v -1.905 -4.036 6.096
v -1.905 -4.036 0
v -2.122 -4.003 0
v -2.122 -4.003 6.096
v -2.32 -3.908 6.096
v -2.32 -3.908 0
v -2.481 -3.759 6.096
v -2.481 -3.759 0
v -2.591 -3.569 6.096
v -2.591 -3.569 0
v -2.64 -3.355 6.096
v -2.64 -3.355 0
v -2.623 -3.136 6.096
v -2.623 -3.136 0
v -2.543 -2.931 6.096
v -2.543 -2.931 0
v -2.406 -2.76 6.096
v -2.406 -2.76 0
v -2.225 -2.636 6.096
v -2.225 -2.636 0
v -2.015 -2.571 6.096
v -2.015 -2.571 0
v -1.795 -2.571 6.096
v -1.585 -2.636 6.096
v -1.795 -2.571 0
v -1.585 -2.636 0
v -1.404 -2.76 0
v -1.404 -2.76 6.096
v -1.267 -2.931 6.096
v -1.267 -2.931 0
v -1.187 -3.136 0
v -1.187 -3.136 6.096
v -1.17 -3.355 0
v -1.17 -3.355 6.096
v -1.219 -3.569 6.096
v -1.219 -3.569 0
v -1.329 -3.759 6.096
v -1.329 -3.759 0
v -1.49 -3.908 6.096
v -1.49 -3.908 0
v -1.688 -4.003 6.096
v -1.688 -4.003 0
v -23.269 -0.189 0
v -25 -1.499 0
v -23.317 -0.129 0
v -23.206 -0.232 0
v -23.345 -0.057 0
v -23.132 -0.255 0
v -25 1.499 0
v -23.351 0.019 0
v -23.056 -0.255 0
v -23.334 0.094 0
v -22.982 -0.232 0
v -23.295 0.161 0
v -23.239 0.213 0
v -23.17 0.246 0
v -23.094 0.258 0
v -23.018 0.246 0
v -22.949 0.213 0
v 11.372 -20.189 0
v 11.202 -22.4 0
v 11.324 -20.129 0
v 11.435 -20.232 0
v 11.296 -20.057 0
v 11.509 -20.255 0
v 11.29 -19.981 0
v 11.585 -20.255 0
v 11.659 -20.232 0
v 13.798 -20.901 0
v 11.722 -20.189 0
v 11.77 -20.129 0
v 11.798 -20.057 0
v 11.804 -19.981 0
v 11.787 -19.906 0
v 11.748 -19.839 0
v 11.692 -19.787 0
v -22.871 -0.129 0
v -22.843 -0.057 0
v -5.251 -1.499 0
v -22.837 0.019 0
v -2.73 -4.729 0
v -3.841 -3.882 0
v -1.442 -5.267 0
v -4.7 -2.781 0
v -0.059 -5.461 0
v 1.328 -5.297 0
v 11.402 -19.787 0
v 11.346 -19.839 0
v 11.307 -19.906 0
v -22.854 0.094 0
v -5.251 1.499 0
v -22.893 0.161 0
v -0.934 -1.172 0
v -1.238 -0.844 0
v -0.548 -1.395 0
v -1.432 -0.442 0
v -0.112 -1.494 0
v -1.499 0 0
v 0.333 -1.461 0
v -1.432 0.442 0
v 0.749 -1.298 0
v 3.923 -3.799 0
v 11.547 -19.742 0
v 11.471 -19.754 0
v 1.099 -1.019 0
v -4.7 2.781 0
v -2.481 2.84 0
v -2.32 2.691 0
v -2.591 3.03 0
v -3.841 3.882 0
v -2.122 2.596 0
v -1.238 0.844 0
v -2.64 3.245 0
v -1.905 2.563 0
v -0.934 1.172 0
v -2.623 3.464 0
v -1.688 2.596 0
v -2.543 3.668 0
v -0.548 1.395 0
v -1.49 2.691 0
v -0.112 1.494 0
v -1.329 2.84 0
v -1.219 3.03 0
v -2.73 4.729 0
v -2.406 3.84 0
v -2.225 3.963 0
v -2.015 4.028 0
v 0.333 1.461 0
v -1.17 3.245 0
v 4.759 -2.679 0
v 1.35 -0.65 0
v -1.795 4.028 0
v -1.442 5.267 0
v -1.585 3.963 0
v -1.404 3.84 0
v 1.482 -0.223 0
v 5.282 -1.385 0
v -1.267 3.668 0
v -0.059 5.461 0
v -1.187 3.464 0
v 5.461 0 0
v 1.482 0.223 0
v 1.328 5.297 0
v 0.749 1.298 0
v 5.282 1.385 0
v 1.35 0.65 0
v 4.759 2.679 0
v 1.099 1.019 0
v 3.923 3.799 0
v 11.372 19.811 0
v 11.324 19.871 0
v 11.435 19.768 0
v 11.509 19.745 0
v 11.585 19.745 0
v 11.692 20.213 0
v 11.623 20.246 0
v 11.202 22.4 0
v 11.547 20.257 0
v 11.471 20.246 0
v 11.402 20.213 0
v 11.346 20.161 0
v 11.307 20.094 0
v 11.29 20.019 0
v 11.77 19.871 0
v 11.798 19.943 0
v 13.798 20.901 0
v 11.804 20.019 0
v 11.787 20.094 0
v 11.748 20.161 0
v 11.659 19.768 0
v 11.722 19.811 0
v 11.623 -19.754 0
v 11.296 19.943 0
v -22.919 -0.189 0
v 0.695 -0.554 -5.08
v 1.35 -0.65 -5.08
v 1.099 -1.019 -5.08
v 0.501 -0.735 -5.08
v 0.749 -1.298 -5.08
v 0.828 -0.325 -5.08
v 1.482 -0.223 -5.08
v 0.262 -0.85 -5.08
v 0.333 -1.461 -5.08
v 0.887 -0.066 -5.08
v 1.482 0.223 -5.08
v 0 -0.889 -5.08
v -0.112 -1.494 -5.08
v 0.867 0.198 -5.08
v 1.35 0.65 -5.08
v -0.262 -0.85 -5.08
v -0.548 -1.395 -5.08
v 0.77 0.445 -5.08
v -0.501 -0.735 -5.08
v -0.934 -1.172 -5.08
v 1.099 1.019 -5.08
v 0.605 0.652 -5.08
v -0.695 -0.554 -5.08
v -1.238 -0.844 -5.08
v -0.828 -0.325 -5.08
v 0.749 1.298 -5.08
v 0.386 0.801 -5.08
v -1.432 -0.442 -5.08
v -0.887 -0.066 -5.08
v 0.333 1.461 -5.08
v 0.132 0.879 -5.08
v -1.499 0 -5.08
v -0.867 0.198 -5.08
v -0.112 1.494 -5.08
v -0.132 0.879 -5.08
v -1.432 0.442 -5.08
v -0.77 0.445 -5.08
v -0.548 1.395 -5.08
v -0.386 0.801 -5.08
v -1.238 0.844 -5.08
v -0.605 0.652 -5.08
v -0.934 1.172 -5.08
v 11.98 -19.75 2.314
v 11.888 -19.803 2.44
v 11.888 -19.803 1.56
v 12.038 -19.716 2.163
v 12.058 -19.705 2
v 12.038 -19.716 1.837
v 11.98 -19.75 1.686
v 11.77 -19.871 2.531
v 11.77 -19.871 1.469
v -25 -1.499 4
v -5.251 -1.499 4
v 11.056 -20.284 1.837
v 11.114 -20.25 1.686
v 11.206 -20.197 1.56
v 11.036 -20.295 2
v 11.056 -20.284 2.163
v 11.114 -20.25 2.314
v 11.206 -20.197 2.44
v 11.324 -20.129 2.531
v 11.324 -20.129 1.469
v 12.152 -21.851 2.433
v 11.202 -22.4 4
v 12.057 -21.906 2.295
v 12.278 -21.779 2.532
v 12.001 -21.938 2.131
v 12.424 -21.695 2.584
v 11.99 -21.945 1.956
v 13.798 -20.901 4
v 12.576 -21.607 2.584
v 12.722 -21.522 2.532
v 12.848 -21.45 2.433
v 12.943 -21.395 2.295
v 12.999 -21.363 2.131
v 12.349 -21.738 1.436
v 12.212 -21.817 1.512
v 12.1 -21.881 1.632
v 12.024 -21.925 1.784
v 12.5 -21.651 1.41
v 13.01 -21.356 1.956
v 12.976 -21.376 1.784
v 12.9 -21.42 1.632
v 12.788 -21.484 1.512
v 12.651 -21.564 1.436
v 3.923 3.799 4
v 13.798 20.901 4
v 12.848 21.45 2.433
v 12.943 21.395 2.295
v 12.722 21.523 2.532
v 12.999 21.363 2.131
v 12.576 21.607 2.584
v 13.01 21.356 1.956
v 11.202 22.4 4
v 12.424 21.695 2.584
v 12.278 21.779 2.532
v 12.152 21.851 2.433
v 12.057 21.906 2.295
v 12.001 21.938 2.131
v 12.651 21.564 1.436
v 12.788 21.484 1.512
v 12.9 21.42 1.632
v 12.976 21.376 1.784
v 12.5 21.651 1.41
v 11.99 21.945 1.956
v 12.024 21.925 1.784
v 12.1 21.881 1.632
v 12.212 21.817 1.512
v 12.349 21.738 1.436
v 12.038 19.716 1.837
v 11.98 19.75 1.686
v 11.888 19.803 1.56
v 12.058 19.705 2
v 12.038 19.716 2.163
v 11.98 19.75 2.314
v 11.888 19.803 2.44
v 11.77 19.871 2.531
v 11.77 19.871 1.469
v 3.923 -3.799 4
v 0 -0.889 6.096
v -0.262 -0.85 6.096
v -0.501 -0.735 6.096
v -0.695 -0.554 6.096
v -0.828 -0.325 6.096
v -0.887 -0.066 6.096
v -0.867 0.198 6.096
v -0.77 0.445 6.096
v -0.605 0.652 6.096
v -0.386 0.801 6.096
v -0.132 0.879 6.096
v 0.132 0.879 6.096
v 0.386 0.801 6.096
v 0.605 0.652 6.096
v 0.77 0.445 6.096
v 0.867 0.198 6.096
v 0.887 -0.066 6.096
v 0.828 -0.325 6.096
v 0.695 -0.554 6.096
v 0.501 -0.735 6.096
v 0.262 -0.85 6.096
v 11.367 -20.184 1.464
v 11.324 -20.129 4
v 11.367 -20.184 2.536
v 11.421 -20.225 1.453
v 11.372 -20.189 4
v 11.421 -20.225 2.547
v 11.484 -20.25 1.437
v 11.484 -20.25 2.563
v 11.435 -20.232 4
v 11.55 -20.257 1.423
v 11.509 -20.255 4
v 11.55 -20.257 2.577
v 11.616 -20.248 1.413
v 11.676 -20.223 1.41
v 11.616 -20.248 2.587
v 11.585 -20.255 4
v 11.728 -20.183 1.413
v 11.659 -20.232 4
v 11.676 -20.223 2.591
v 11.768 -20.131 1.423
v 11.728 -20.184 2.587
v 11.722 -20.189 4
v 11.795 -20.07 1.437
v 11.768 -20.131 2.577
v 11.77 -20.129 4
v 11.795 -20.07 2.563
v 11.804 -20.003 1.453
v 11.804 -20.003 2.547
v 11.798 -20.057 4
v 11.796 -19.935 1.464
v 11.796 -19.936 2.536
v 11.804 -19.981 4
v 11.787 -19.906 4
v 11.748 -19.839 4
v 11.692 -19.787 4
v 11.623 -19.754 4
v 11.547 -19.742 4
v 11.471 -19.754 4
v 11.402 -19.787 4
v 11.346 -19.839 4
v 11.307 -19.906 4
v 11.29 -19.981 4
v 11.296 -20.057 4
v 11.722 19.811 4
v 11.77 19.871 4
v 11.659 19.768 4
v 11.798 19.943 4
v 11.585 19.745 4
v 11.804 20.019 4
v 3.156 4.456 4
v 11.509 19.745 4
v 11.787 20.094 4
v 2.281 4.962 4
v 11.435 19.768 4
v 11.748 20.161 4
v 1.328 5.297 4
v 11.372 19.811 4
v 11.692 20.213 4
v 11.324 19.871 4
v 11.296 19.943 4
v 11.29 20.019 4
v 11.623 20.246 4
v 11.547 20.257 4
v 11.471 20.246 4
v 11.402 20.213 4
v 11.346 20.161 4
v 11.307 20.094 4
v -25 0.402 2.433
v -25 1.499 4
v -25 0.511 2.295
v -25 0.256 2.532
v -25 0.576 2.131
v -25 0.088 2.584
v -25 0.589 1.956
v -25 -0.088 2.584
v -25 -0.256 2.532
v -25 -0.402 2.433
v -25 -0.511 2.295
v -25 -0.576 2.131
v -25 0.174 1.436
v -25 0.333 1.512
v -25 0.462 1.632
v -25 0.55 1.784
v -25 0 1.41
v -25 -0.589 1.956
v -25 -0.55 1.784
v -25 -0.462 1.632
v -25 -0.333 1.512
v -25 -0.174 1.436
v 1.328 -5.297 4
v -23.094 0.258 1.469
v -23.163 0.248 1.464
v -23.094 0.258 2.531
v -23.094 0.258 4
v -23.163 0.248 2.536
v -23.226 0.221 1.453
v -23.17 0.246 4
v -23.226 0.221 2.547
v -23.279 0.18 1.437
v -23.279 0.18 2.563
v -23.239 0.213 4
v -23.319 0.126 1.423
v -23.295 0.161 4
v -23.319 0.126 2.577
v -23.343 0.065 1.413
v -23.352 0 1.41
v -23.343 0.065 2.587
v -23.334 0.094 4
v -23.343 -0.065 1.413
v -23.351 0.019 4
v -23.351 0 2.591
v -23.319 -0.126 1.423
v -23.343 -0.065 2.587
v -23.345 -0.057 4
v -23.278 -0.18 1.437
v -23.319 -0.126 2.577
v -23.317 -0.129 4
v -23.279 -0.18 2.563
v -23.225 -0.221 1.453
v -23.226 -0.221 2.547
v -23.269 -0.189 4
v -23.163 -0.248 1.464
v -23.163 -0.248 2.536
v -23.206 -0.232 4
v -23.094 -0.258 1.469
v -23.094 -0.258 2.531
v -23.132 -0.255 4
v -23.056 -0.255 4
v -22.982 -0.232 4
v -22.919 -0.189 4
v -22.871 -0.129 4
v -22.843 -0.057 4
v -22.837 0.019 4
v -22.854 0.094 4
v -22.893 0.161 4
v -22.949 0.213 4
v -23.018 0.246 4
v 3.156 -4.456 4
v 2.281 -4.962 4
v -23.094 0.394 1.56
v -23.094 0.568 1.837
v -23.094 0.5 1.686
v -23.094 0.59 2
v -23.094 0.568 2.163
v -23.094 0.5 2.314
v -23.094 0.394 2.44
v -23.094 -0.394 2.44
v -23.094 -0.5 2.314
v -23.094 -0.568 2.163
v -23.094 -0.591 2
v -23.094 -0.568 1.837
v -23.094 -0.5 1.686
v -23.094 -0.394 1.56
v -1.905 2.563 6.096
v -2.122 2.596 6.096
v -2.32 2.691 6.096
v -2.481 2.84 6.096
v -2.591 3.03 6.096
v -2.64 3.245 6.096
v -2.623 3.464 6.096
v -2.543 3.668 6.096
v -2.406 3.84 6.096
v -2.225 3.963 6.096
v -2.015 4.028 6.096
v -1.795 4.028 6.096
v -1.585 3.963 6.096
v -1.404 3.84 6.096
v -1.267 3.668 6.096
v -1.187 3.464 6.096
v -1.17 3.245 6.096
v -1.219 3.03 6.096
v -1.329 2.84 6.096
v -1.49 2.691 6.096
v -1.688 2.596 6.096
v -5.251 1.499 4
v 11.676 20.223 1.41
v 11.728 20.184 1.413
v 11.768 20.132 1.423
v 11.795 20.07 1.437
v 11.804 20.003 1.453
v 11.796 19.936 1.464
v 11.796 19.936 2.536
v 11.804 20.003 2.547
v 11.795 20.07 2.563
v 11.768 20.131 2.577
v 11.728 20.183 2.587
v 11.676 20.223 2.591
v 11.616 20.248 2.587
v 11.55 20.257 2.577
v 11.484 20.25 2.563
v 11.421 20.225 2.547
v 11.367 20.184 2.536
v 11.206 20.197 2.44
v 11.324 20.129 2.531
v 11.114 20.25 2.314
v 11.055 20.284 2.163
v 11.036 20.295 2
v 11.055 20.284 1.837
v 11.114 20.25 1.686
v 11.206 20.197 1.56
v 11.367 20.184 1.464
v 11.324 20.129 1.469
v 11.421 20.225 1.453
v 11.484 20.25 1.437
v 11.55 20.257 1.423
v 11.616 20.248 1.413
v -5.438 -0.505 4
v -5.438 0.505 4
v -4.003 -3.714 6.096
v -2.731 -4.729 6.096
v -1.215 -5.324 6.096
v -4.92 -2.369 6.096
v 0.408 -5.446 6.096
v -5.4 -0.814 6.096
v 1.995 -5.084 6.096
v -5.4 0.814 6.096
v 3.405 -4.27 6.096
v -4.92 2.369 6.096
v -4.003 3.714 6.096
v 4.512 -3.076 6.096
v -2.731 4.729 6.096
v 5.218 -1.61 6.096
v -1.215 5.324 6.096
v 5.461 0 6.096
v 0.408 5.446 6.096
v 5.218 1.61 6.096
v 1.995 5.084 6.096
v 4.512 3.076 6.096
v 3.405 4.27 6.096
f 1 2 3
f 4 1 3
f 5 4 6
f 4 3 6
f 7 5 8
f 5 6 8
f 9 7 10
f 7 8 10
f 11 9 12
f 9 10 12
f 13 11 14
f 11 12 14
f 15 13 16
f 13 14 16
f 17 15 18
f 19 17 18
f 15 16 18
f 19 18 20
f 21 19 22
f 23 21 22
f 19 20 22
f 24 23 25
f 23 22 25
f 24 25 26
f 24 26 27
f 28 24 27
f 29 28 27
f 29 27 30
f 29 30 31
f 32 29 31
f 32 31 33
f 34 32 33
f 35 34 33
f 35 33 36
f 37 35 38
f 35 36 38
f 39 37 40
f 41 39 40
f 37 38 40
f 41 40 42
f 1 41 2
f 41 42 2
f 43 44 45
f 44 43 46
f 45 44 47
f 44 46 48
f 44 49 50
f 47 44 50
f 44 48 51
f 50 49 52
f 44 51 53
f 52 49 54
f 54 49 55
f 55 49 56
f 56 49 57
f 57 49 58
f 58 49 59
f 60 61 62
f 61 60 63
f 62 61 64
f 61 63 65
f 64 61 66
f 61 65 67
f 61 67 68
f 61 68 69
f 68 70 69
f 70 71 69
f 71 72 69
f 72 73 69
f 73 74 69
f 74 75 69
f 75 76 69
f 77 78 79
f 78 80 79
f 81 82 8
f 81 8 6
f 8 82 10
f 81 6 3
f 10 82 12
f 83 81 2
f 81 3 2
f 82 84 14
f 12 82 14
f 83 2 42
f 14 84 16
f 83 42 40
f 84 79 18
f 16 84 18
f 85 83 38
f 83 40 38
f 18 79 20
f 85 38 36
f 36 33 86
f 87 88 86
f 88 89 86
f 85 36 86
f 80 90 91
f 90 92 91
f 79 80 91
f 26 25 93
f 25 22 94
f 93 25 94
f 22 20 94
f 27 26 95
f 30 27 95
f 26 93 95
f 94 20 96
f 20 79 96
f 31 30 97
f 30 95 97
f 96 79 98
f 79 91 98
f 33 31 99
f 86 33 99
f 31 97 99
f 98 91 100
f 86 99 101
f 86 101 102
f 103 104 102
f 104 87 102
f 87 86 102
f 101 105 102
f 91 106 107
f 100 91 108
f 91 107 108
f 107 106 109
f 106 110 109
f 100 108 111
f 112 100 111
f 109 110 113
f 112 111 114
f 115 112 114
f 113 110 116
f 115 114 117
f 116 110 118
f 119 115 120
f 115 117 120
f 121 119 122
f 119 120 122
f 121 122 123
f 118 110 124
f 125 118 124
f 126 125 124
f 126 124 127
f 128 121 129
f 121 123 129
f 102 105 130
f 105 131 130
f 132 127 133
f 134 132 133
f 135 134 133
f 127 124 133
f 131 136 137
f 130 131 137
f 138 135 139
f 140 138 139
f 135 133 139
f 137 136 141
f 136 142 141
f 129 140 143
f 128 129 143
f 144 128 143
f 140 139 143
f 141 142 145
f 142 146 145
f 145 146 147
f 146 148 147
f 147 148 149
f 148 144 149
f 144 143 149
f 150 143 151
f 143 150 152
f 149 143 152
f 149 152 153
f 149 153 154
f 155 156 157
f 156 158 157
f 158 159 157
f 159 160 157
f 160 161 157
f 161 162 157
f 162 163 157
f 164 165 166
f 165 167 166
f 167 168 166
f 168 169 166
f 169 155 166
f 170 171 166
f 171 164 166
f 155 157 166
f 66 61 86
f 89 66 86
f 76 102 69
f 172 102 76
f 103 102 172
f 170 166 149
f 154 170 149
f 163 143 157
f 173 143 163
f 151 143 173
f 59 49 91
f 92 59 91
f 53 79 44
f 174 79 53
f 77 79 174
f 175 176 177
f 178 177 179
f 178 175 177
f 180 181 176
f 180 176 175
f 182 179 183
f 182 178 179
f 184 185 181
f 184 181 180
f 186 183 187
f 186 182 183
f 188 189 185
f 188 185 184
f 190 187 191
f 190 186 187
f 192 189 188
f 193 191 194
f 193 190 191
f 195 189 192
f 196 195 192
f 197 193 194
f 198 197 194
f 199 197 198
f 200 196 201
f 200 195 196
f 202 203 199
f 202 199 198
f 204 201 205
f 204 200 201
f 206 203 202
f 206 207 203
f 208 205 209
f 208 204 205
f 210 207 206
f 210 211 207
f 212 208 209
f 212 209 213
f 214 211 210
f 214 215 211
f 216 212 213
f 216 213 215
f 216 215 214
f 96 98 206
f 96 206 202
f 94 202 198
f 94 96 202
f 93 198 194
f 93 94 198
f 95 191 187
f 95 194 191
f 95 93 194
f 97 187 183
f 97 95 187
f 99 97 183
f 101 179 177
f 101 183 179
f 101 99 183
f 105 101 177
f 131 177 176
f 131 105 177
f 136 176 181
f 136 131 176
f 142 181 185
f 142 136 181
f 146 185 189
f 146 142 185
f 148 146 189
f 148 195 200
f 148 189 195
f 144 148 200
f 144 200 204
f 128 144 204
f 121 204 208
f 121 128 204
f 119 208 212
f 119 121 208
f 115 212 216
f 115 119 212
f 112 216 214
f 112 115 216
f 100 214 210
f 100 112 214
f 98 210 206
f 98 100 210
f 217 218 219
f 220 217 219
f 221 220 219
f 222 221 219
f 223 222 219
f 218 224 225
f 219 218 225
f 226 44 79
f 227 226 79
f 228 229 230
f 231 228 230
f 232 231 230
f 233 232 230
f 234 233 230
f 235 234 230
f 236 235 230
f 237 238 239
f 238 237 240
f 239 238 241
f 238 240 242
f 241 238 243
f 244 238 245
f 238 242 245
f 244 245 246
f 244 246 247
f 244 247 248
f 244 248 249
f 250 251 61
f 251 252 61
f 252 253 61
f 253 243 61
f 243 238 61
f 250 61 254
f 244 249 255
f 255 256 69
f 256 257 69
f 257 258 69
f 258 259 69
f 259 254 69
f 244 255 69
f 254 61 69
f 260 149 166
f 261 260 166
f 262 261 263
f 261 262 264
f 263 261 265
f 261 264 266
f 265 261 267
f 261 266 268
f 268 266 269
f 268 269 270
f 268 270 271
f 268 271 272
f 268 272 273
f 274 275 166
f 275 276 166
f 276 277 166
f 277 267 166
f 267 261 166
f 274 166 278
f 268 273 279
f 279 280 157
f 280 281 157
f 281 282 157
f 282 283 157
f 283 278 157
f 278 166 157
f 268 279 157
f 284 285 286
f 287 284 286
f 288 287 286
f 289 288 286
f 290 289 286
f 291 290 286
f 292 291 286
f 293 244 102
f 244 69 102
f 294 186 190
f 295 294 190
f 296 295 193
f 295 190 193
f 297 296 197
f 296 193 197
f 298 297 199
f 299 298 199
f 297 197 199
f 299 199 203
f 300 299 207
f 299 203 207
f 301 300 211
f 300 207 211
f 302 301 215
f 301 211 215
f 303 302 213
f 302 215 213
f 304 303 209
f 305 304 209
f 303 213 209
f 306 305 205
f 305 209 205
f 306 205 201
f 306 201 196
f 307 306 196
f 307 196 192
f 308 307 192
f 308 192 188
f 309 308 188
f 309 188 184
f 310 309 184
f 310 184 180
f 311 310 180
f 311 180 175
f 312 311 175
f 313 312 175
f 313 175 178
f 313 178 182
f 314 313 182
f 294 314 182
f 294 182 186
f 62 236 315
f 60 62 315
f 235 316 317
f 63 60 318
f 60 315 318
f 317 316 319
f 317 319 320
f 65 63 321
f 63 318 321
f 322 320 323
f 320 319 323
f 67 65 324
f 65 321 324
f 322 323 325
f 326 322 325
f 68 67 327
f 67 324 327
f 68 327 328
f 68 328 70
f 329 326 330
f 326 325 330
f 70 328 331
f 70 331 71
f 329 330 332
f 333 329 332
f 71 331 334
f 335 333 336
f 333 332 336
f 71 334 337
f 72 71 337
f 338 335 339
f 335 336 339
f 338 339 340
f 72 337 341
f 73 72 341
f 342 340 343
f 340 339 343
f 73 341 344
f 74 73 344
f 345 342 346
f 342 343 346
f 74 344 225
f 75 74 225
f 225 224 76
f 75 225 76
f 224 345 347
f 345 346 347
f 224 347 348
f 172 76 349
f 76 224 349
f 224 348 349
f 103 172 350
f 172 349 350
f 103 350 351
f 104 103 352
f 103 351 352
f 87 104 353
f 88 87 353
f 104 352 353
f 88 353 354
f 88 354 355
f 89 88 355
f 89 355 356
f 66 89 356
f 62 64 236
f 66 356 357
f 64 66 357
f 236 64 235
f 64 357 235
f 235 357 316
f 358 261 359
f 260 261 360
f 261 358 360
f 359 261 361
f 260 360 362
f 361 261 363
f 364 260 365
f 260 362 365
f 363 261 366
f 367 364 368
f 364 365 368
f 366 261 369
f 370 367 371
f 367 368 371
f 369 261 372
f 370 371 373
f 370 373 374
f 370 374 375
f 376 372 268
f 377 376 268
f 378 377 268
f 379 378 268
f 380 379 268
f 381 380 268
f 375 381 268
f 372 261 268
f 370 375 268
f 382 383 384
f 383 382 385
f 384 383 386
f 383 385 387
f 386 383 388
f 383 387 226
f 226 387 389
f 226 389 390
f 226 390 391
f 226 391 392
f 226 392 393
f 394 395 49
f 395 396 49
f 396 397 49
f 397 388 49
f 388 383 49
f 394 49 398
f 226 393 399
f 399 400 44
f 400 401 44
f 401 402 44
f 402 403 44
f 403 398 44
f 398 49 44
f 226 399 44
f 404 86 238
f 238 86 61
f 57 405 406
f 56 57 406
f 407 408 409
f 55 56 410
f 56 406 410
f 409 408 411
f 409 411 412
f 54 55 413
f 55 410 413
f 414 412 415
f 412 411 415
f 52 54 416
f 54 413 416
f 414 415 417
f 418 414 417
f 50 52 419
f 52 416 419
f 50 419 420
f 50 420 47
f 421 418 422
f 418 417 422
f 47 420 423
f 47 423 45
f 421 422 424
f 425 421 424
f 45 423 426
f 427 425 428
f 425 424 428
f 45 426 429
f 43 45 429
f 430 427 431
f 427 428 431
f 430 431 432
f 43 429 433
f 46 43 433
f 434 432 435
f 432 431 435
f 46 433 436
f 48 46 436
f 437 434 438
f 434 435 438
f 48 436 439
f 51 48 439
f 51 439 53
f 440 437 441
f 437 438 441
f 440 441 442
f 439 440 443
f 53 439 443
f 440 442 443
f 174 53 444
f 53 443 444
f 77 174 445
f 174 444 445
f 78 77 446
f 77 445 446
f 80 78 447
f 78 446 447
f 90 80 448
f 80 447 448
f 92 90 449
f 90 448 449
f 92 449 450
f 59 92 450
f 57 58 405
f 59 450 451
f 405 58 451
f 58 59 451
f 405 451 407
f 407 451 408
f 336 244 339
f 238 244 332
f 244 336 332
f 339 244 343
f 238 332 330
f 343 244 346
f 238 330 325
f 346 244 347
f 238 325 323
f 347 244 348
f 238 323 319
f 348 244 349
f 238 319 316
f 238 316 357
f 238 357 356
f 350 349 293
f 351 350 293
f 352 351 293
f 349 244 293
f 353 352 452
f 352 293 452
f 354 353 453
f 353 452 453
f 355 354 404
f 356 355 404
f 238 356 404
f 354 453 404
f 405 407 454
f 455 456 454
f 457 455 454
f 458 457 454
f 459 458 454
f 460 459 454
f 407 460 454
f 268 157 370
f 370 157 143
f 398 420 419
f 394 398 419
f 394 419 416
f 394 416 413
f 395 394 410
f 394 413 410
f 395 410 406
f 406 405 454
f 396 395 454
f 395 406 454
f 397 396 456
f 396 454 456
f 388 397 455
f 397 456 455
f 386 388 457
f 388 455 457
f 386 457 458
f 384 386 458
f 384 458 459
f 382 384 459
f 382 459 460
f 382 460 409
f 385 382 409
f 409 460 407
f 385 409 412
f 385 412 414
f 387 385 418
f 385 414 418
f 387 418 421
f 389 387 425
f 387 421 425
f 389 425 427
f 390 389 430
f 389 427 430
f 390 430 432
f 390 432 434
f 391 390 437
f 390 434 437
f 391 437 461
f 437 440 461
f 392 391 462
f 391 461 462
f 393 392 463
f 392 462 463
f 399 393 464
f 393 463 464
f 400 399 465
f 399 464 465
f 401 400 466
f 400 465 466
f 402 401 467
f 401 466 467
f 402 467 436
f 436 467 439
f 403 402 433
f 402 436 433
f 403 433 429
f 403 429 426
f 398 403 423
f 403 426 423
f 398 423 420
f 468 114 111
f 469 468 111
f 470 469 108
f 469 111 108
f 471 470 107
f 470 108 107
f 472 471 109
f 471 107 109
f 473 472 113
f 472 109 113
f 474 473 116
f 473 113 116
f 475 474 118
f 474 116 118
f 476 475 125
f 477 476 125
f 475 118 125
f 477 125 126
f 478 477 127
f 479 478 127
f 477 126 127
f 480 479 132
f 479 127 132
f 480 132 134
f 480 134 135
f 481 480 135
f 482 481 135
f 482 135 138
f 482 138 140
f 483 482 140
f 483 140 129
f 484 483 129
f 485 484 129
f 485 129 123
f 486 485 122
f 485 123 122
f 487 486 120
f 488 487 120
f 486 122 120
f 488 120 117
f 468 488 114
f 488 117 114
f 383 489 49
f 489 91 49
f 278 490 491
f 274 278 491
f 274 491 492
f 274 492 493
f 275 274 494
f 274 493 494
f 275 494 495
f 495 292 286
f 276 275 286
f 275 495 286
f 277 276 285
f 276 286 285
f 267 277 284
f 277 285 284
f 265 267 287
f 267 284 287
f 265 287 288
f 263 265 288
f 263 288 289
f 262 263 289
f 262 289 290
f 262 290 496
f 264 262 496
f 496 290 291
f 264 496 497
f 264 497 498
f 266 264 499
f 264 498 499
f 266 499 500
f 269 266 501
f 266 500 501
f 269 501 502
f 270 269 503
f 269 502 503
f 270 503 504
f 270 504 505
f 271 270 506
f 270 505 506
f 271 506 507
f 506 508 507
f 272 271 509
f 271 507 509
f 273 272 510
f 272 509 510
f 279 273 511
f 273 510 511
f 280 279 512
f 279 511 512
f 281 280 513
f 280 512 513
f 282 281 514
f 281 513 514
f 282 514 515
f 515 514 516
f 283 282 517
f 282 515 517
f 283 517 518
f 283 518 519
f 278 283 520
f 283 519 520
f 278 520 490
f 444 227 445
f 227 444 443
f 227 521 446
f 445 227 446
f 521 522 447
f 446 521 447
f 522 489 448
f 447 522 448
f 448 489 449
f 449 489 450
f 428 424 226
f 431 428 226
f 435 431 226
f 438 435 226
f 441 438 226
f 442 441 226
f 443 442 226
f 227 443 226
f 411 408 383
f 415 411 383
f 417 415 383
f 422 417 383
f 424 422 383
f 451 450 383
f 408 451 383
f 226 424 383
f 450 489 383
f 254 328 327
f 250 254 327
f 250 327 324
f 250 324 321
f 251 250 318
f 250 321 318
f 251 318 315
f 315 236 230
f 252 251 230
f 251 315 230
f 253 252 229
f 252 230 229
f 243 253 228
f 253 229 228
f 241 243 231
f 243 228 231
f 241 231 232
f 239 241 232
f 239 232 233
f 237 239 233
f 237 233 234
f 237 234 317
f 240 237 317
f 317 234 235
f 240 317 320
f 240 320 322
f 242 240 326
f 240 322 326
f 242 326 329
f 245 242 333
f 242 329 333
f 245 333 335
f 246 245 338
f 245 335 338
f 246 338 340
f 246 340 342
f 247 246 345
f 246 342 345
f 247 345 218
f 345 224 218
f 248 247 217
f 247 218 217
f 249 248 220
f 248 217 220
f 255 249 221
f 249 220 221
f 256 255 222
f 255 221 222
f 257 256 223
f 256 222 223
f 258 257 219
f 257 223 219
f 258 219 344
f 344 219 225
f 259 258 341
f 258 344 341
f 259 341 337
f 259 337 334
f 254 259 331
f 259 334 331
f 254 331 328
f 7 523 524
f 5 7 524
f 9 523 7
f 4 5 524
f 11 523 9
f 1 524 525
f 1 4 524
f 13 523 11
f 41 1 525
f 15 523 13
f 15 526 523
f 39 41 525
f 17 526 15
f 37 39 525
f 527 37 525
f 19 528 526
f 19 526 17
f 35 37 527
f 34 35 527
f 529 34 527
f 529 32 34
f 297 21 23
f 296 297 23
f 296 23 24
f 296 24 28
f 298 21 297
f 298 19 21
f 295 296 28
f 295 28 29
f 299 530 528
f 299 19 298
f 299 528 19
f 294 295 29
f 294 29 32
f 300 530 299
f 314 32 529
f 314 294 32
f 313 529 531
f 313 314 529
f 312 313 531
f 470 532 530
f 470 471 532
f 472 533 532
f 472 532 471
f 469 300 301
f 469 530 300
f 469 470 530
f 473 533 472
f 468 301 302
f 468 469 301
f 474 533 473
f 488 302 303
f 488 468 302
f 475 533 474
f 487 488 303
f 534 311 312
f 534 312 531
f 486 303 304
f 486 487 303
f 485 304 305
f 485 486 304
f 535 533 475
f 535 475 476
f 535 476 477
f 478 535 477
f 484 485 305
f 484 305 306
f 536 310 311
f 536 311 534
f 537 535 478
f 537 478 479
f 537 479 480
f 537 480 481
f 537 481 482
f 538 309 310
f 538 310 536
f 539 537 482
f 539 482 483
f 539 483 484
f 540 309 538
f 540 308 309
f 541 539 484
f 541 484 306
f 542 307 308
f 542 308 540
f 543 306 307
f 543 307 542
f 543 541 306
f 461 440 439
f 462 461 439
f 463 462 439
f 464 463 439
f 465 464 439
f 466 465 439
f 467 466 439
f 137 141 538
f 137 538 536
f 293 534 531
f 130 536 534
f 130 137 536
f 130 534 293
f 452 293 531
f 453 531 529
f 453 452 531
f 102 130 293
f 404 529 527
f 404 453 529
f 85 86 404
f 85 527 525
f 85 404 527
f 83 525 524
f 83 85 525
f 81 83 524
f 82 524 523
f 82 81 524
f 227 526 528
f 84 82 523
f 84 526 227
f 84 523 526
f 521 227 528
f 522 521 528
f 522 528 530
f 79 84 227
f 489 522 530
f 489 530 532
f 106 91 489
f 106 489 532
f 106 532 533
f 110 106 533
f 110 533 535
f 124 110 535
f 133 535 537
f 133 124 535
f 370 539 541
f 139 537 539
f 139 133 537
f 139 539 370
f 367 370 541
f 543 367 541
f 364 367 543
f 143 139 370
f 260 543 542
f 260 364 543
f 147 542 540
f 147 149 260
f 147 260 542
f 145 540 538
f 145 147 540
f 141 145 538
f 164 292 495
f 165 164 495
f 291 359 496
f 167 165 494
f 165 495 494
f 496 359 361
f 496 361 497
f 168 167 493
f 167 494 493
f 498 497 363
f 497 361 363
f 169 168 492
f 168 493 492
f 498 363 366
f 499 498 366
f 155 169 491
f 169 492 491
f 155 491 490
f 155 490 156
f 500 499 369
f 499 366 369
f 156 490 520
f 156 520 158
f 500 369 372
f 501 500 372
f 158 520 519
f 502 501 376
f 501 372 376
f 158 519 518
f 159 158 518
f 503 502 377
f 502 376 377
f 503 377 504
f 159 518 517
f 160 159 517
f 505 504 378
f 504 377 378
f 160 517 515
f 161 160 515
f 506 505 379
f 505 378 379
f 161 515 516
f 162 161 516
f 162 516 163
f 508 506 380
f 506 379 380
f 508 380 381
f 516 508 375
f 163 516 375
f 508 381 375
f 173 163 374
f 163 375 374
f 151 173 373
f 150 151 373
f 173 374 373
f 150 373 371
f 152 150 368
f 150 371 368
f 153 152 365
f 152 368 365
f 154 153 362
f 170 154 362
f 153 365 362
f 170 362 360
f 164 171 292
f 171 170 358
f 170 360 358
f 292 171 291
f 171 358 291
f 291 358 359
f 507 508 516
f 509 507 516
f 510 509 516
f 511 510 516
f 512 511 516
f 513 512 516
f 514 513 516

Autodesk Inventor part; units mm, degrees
ref_plane "YZ Plane" through (0, 0, 0) normal (1, 0, 0) x (0, 1, 0)
ref_plane "XZ Plane" through (0, 0, 0) normal (0, 1, 0) x (-1, 0, 0)
ref_plane "XY Plane" through (0, 0, 0) normal (0, 0, 1) x (1, 0, 0)
sketch "Sketch1" plane through (0, 0, 0) normal (0, 0, 1) x (1, 0, 0)
  circle A0 centre (0, 0) radius 5.461
  dimension "d0" = 10.922
extrude "Extrusion1" add sketch "Sketch1" along normal blind 6.096
sketch "Sketch2" plane through (0, 0, 0) normal (0, 0, -1) x (-1, 0, 0)
  circle A0 centre (0, 0) radius 5.461 projected
  line L0 (0, -35) -> (0, 35) projected
  line L1 (35, 0) -> (-35, 0) projected
  line L2 (0, 1.4986) -> (25, 1.4986)
  line L3 (25, 1.4986) -> (25, -1.4986)
  line L4 (25, -1.4986) -> (0, -1.4986)
  line L5 (0, -1.4986) -> (0, 1.4986)
  line L6 (-1.2978, -0.7493) -> (-13.7978, 20.9013)
  line L7 (-13.7978, 20.9013) -> (-11.2022, 22.3999)
  line L8 (-11.2022, 22.3999) -> (1.2978, 0.7493)
  line L9 (1.2978, 0.7493) -> (-1.2978, -0.7493)
  line L10 (1.2978, -0.7493) -> (-11.2022, -22.3999)
  line L11 (-11.2022, -22.3999) -> (-13.7978, -20.9013)
  line L12 (-13.7978, -20.9013) -> (-1.2978, 0.7493)
  line L13 (-1.2978, 0.7493) -> (1.2978, -0.7493)
  circle A1 centre (0, 0) radius 25
  point P0 (25, 0)
  point P1 (-12.5, 21.6506)
  point P2 (-12.5, -21.6506)
  dimension "d3" = 2.9972
  dimension "d6" = 360
  dimension "d8" = 50
extrude "Extrusion2" add sketch "Sketch2" against normal blind 4 contours L1 L9 L8 L2 A0 | L1 A1 L4 A0 | A0 L2 A1 L1 | A0 L4 L10 L13 L1 | A1 L2 L3 | L3 L4 A1 | L13 L10 L4 L0 | L13 L12 L6 A0 L8 L0 | L9 L6 L1 | L0 L2 L8 L9 | L0 L10 A0 L12 L6 L9 | L1 L12 L13 | L2 L0 L8 | L10 L0 L4 | A0 L6 A1 L8 | L10 A1 L12 A0 | A1 L7 L8 | L10 L11 A1 | L6 L7 A1 | A1 L11 L12
sketch "Sketch6" plane through (0, 0, 0) normal (0, 0, -1) x (-1, 0, 0)
  line L0 (5.2514, 1.4986) -> (25, 1.4986) projected
  arc A0 (-3.9235, 3.7985) -> (-3.9235, -3.7985) centre (0, 0) ccw projected
  circle A1 centre (0, 0) radius 23.094
  line L1 (0, 0) -> (27, 0)
  line L2 (0, 0) -> (-13.5, -23.3827)
  line L3 (0, 0) -> (-13.5, 23.3827)
  point P0 (-11.547, 20)
  point P1 (23.094, 0)
  dimension "d26" = 360
  dimension "d28" = 40
hole "Hole2" at (-23.094, 0, 0) direction (0, 0, 1) diameter 0.515 end through all
pattern_circular "Circular Pattern2" count 3 over 360 about axis through (0, 0, -10) along (0, 0, 1) of "Hole2"
sketch "Sketch8" plane through (11.2022, -22.3999, 0) normal (0.5, -0.8660254, 0) x (0.8660254, 0.5, 0)
  line L0 (2.9972, 4) -> (0, 4) projected
  line L1 (1.4986, -1.2192) -> (1.4986, 7.3152) projected
  line L2 (1.4986, 4) -> (1.4986, 0)
  point P0 (1.4986, 2)
hole "Hole4" at (12.5, -21.6506, 2) direction (-0.5, 0.8660254, 0) diameter 1.181 depth 1.906 thread size "0-80 UNF" class "2B" standard "ANSI Unified Screw Threads"
pattern_circular "Circular Pattern3(Side_hole)" count 3 over 360 about axis through (0, 0, -10) along (0, 0, 1) of "Hole4"
sketch "Sketch18" plane through (0, 0, 6.096) normal (0, 0, 1) x (1, 0, 0)
  circle A0 centre (0, 0) radius 5.461 projected
  line L0 (-32.72, 0) -> (21.3198, 0) projected
  point P0 (3.81, 0)
  point P1 (-1.905, 3.2996)
  point P2 (-1.905, -3.2996)
  dimension "d87" = 3.81
  dimension "d90" = 360
hole "Hole7" at (-1.905, 3.2996, 6.096) at (-1.905, -3.2996, 6.096) direction (0, 0, -1) diameter 1.4732 end through all
sketch "Sketch22" plane through (0, 0, 0) normal (0, 0, -1) x (-1, 0, 0)
  arc A0 (-1.3279, -5.2971) -> (5.2514, -1.4986) centre (0, 0) ccw projected
  circle A1 centre (0, 0) radius 1.4986
  dimension "d104" = 2.9972
extrude "Extrusion9" add sketch "Sketch22" along normal blind 5.08
sketch "Sketch23" plane through (0, 0, 6.096) normal (0, 0, 1) x (1, 0, 0)
  circle A0 centre (0, 0) radius 5.461 projected
hole "Hole8" at (0, 0, 6.096) direction (0, 0, -1) diameter 1.778 end through all clearance for "Flat Head Machine Screw (82)" size "#0" standard "Ansi Unified Screw Threads"
properties part number "TriPost" material "Aluminum-6061"
